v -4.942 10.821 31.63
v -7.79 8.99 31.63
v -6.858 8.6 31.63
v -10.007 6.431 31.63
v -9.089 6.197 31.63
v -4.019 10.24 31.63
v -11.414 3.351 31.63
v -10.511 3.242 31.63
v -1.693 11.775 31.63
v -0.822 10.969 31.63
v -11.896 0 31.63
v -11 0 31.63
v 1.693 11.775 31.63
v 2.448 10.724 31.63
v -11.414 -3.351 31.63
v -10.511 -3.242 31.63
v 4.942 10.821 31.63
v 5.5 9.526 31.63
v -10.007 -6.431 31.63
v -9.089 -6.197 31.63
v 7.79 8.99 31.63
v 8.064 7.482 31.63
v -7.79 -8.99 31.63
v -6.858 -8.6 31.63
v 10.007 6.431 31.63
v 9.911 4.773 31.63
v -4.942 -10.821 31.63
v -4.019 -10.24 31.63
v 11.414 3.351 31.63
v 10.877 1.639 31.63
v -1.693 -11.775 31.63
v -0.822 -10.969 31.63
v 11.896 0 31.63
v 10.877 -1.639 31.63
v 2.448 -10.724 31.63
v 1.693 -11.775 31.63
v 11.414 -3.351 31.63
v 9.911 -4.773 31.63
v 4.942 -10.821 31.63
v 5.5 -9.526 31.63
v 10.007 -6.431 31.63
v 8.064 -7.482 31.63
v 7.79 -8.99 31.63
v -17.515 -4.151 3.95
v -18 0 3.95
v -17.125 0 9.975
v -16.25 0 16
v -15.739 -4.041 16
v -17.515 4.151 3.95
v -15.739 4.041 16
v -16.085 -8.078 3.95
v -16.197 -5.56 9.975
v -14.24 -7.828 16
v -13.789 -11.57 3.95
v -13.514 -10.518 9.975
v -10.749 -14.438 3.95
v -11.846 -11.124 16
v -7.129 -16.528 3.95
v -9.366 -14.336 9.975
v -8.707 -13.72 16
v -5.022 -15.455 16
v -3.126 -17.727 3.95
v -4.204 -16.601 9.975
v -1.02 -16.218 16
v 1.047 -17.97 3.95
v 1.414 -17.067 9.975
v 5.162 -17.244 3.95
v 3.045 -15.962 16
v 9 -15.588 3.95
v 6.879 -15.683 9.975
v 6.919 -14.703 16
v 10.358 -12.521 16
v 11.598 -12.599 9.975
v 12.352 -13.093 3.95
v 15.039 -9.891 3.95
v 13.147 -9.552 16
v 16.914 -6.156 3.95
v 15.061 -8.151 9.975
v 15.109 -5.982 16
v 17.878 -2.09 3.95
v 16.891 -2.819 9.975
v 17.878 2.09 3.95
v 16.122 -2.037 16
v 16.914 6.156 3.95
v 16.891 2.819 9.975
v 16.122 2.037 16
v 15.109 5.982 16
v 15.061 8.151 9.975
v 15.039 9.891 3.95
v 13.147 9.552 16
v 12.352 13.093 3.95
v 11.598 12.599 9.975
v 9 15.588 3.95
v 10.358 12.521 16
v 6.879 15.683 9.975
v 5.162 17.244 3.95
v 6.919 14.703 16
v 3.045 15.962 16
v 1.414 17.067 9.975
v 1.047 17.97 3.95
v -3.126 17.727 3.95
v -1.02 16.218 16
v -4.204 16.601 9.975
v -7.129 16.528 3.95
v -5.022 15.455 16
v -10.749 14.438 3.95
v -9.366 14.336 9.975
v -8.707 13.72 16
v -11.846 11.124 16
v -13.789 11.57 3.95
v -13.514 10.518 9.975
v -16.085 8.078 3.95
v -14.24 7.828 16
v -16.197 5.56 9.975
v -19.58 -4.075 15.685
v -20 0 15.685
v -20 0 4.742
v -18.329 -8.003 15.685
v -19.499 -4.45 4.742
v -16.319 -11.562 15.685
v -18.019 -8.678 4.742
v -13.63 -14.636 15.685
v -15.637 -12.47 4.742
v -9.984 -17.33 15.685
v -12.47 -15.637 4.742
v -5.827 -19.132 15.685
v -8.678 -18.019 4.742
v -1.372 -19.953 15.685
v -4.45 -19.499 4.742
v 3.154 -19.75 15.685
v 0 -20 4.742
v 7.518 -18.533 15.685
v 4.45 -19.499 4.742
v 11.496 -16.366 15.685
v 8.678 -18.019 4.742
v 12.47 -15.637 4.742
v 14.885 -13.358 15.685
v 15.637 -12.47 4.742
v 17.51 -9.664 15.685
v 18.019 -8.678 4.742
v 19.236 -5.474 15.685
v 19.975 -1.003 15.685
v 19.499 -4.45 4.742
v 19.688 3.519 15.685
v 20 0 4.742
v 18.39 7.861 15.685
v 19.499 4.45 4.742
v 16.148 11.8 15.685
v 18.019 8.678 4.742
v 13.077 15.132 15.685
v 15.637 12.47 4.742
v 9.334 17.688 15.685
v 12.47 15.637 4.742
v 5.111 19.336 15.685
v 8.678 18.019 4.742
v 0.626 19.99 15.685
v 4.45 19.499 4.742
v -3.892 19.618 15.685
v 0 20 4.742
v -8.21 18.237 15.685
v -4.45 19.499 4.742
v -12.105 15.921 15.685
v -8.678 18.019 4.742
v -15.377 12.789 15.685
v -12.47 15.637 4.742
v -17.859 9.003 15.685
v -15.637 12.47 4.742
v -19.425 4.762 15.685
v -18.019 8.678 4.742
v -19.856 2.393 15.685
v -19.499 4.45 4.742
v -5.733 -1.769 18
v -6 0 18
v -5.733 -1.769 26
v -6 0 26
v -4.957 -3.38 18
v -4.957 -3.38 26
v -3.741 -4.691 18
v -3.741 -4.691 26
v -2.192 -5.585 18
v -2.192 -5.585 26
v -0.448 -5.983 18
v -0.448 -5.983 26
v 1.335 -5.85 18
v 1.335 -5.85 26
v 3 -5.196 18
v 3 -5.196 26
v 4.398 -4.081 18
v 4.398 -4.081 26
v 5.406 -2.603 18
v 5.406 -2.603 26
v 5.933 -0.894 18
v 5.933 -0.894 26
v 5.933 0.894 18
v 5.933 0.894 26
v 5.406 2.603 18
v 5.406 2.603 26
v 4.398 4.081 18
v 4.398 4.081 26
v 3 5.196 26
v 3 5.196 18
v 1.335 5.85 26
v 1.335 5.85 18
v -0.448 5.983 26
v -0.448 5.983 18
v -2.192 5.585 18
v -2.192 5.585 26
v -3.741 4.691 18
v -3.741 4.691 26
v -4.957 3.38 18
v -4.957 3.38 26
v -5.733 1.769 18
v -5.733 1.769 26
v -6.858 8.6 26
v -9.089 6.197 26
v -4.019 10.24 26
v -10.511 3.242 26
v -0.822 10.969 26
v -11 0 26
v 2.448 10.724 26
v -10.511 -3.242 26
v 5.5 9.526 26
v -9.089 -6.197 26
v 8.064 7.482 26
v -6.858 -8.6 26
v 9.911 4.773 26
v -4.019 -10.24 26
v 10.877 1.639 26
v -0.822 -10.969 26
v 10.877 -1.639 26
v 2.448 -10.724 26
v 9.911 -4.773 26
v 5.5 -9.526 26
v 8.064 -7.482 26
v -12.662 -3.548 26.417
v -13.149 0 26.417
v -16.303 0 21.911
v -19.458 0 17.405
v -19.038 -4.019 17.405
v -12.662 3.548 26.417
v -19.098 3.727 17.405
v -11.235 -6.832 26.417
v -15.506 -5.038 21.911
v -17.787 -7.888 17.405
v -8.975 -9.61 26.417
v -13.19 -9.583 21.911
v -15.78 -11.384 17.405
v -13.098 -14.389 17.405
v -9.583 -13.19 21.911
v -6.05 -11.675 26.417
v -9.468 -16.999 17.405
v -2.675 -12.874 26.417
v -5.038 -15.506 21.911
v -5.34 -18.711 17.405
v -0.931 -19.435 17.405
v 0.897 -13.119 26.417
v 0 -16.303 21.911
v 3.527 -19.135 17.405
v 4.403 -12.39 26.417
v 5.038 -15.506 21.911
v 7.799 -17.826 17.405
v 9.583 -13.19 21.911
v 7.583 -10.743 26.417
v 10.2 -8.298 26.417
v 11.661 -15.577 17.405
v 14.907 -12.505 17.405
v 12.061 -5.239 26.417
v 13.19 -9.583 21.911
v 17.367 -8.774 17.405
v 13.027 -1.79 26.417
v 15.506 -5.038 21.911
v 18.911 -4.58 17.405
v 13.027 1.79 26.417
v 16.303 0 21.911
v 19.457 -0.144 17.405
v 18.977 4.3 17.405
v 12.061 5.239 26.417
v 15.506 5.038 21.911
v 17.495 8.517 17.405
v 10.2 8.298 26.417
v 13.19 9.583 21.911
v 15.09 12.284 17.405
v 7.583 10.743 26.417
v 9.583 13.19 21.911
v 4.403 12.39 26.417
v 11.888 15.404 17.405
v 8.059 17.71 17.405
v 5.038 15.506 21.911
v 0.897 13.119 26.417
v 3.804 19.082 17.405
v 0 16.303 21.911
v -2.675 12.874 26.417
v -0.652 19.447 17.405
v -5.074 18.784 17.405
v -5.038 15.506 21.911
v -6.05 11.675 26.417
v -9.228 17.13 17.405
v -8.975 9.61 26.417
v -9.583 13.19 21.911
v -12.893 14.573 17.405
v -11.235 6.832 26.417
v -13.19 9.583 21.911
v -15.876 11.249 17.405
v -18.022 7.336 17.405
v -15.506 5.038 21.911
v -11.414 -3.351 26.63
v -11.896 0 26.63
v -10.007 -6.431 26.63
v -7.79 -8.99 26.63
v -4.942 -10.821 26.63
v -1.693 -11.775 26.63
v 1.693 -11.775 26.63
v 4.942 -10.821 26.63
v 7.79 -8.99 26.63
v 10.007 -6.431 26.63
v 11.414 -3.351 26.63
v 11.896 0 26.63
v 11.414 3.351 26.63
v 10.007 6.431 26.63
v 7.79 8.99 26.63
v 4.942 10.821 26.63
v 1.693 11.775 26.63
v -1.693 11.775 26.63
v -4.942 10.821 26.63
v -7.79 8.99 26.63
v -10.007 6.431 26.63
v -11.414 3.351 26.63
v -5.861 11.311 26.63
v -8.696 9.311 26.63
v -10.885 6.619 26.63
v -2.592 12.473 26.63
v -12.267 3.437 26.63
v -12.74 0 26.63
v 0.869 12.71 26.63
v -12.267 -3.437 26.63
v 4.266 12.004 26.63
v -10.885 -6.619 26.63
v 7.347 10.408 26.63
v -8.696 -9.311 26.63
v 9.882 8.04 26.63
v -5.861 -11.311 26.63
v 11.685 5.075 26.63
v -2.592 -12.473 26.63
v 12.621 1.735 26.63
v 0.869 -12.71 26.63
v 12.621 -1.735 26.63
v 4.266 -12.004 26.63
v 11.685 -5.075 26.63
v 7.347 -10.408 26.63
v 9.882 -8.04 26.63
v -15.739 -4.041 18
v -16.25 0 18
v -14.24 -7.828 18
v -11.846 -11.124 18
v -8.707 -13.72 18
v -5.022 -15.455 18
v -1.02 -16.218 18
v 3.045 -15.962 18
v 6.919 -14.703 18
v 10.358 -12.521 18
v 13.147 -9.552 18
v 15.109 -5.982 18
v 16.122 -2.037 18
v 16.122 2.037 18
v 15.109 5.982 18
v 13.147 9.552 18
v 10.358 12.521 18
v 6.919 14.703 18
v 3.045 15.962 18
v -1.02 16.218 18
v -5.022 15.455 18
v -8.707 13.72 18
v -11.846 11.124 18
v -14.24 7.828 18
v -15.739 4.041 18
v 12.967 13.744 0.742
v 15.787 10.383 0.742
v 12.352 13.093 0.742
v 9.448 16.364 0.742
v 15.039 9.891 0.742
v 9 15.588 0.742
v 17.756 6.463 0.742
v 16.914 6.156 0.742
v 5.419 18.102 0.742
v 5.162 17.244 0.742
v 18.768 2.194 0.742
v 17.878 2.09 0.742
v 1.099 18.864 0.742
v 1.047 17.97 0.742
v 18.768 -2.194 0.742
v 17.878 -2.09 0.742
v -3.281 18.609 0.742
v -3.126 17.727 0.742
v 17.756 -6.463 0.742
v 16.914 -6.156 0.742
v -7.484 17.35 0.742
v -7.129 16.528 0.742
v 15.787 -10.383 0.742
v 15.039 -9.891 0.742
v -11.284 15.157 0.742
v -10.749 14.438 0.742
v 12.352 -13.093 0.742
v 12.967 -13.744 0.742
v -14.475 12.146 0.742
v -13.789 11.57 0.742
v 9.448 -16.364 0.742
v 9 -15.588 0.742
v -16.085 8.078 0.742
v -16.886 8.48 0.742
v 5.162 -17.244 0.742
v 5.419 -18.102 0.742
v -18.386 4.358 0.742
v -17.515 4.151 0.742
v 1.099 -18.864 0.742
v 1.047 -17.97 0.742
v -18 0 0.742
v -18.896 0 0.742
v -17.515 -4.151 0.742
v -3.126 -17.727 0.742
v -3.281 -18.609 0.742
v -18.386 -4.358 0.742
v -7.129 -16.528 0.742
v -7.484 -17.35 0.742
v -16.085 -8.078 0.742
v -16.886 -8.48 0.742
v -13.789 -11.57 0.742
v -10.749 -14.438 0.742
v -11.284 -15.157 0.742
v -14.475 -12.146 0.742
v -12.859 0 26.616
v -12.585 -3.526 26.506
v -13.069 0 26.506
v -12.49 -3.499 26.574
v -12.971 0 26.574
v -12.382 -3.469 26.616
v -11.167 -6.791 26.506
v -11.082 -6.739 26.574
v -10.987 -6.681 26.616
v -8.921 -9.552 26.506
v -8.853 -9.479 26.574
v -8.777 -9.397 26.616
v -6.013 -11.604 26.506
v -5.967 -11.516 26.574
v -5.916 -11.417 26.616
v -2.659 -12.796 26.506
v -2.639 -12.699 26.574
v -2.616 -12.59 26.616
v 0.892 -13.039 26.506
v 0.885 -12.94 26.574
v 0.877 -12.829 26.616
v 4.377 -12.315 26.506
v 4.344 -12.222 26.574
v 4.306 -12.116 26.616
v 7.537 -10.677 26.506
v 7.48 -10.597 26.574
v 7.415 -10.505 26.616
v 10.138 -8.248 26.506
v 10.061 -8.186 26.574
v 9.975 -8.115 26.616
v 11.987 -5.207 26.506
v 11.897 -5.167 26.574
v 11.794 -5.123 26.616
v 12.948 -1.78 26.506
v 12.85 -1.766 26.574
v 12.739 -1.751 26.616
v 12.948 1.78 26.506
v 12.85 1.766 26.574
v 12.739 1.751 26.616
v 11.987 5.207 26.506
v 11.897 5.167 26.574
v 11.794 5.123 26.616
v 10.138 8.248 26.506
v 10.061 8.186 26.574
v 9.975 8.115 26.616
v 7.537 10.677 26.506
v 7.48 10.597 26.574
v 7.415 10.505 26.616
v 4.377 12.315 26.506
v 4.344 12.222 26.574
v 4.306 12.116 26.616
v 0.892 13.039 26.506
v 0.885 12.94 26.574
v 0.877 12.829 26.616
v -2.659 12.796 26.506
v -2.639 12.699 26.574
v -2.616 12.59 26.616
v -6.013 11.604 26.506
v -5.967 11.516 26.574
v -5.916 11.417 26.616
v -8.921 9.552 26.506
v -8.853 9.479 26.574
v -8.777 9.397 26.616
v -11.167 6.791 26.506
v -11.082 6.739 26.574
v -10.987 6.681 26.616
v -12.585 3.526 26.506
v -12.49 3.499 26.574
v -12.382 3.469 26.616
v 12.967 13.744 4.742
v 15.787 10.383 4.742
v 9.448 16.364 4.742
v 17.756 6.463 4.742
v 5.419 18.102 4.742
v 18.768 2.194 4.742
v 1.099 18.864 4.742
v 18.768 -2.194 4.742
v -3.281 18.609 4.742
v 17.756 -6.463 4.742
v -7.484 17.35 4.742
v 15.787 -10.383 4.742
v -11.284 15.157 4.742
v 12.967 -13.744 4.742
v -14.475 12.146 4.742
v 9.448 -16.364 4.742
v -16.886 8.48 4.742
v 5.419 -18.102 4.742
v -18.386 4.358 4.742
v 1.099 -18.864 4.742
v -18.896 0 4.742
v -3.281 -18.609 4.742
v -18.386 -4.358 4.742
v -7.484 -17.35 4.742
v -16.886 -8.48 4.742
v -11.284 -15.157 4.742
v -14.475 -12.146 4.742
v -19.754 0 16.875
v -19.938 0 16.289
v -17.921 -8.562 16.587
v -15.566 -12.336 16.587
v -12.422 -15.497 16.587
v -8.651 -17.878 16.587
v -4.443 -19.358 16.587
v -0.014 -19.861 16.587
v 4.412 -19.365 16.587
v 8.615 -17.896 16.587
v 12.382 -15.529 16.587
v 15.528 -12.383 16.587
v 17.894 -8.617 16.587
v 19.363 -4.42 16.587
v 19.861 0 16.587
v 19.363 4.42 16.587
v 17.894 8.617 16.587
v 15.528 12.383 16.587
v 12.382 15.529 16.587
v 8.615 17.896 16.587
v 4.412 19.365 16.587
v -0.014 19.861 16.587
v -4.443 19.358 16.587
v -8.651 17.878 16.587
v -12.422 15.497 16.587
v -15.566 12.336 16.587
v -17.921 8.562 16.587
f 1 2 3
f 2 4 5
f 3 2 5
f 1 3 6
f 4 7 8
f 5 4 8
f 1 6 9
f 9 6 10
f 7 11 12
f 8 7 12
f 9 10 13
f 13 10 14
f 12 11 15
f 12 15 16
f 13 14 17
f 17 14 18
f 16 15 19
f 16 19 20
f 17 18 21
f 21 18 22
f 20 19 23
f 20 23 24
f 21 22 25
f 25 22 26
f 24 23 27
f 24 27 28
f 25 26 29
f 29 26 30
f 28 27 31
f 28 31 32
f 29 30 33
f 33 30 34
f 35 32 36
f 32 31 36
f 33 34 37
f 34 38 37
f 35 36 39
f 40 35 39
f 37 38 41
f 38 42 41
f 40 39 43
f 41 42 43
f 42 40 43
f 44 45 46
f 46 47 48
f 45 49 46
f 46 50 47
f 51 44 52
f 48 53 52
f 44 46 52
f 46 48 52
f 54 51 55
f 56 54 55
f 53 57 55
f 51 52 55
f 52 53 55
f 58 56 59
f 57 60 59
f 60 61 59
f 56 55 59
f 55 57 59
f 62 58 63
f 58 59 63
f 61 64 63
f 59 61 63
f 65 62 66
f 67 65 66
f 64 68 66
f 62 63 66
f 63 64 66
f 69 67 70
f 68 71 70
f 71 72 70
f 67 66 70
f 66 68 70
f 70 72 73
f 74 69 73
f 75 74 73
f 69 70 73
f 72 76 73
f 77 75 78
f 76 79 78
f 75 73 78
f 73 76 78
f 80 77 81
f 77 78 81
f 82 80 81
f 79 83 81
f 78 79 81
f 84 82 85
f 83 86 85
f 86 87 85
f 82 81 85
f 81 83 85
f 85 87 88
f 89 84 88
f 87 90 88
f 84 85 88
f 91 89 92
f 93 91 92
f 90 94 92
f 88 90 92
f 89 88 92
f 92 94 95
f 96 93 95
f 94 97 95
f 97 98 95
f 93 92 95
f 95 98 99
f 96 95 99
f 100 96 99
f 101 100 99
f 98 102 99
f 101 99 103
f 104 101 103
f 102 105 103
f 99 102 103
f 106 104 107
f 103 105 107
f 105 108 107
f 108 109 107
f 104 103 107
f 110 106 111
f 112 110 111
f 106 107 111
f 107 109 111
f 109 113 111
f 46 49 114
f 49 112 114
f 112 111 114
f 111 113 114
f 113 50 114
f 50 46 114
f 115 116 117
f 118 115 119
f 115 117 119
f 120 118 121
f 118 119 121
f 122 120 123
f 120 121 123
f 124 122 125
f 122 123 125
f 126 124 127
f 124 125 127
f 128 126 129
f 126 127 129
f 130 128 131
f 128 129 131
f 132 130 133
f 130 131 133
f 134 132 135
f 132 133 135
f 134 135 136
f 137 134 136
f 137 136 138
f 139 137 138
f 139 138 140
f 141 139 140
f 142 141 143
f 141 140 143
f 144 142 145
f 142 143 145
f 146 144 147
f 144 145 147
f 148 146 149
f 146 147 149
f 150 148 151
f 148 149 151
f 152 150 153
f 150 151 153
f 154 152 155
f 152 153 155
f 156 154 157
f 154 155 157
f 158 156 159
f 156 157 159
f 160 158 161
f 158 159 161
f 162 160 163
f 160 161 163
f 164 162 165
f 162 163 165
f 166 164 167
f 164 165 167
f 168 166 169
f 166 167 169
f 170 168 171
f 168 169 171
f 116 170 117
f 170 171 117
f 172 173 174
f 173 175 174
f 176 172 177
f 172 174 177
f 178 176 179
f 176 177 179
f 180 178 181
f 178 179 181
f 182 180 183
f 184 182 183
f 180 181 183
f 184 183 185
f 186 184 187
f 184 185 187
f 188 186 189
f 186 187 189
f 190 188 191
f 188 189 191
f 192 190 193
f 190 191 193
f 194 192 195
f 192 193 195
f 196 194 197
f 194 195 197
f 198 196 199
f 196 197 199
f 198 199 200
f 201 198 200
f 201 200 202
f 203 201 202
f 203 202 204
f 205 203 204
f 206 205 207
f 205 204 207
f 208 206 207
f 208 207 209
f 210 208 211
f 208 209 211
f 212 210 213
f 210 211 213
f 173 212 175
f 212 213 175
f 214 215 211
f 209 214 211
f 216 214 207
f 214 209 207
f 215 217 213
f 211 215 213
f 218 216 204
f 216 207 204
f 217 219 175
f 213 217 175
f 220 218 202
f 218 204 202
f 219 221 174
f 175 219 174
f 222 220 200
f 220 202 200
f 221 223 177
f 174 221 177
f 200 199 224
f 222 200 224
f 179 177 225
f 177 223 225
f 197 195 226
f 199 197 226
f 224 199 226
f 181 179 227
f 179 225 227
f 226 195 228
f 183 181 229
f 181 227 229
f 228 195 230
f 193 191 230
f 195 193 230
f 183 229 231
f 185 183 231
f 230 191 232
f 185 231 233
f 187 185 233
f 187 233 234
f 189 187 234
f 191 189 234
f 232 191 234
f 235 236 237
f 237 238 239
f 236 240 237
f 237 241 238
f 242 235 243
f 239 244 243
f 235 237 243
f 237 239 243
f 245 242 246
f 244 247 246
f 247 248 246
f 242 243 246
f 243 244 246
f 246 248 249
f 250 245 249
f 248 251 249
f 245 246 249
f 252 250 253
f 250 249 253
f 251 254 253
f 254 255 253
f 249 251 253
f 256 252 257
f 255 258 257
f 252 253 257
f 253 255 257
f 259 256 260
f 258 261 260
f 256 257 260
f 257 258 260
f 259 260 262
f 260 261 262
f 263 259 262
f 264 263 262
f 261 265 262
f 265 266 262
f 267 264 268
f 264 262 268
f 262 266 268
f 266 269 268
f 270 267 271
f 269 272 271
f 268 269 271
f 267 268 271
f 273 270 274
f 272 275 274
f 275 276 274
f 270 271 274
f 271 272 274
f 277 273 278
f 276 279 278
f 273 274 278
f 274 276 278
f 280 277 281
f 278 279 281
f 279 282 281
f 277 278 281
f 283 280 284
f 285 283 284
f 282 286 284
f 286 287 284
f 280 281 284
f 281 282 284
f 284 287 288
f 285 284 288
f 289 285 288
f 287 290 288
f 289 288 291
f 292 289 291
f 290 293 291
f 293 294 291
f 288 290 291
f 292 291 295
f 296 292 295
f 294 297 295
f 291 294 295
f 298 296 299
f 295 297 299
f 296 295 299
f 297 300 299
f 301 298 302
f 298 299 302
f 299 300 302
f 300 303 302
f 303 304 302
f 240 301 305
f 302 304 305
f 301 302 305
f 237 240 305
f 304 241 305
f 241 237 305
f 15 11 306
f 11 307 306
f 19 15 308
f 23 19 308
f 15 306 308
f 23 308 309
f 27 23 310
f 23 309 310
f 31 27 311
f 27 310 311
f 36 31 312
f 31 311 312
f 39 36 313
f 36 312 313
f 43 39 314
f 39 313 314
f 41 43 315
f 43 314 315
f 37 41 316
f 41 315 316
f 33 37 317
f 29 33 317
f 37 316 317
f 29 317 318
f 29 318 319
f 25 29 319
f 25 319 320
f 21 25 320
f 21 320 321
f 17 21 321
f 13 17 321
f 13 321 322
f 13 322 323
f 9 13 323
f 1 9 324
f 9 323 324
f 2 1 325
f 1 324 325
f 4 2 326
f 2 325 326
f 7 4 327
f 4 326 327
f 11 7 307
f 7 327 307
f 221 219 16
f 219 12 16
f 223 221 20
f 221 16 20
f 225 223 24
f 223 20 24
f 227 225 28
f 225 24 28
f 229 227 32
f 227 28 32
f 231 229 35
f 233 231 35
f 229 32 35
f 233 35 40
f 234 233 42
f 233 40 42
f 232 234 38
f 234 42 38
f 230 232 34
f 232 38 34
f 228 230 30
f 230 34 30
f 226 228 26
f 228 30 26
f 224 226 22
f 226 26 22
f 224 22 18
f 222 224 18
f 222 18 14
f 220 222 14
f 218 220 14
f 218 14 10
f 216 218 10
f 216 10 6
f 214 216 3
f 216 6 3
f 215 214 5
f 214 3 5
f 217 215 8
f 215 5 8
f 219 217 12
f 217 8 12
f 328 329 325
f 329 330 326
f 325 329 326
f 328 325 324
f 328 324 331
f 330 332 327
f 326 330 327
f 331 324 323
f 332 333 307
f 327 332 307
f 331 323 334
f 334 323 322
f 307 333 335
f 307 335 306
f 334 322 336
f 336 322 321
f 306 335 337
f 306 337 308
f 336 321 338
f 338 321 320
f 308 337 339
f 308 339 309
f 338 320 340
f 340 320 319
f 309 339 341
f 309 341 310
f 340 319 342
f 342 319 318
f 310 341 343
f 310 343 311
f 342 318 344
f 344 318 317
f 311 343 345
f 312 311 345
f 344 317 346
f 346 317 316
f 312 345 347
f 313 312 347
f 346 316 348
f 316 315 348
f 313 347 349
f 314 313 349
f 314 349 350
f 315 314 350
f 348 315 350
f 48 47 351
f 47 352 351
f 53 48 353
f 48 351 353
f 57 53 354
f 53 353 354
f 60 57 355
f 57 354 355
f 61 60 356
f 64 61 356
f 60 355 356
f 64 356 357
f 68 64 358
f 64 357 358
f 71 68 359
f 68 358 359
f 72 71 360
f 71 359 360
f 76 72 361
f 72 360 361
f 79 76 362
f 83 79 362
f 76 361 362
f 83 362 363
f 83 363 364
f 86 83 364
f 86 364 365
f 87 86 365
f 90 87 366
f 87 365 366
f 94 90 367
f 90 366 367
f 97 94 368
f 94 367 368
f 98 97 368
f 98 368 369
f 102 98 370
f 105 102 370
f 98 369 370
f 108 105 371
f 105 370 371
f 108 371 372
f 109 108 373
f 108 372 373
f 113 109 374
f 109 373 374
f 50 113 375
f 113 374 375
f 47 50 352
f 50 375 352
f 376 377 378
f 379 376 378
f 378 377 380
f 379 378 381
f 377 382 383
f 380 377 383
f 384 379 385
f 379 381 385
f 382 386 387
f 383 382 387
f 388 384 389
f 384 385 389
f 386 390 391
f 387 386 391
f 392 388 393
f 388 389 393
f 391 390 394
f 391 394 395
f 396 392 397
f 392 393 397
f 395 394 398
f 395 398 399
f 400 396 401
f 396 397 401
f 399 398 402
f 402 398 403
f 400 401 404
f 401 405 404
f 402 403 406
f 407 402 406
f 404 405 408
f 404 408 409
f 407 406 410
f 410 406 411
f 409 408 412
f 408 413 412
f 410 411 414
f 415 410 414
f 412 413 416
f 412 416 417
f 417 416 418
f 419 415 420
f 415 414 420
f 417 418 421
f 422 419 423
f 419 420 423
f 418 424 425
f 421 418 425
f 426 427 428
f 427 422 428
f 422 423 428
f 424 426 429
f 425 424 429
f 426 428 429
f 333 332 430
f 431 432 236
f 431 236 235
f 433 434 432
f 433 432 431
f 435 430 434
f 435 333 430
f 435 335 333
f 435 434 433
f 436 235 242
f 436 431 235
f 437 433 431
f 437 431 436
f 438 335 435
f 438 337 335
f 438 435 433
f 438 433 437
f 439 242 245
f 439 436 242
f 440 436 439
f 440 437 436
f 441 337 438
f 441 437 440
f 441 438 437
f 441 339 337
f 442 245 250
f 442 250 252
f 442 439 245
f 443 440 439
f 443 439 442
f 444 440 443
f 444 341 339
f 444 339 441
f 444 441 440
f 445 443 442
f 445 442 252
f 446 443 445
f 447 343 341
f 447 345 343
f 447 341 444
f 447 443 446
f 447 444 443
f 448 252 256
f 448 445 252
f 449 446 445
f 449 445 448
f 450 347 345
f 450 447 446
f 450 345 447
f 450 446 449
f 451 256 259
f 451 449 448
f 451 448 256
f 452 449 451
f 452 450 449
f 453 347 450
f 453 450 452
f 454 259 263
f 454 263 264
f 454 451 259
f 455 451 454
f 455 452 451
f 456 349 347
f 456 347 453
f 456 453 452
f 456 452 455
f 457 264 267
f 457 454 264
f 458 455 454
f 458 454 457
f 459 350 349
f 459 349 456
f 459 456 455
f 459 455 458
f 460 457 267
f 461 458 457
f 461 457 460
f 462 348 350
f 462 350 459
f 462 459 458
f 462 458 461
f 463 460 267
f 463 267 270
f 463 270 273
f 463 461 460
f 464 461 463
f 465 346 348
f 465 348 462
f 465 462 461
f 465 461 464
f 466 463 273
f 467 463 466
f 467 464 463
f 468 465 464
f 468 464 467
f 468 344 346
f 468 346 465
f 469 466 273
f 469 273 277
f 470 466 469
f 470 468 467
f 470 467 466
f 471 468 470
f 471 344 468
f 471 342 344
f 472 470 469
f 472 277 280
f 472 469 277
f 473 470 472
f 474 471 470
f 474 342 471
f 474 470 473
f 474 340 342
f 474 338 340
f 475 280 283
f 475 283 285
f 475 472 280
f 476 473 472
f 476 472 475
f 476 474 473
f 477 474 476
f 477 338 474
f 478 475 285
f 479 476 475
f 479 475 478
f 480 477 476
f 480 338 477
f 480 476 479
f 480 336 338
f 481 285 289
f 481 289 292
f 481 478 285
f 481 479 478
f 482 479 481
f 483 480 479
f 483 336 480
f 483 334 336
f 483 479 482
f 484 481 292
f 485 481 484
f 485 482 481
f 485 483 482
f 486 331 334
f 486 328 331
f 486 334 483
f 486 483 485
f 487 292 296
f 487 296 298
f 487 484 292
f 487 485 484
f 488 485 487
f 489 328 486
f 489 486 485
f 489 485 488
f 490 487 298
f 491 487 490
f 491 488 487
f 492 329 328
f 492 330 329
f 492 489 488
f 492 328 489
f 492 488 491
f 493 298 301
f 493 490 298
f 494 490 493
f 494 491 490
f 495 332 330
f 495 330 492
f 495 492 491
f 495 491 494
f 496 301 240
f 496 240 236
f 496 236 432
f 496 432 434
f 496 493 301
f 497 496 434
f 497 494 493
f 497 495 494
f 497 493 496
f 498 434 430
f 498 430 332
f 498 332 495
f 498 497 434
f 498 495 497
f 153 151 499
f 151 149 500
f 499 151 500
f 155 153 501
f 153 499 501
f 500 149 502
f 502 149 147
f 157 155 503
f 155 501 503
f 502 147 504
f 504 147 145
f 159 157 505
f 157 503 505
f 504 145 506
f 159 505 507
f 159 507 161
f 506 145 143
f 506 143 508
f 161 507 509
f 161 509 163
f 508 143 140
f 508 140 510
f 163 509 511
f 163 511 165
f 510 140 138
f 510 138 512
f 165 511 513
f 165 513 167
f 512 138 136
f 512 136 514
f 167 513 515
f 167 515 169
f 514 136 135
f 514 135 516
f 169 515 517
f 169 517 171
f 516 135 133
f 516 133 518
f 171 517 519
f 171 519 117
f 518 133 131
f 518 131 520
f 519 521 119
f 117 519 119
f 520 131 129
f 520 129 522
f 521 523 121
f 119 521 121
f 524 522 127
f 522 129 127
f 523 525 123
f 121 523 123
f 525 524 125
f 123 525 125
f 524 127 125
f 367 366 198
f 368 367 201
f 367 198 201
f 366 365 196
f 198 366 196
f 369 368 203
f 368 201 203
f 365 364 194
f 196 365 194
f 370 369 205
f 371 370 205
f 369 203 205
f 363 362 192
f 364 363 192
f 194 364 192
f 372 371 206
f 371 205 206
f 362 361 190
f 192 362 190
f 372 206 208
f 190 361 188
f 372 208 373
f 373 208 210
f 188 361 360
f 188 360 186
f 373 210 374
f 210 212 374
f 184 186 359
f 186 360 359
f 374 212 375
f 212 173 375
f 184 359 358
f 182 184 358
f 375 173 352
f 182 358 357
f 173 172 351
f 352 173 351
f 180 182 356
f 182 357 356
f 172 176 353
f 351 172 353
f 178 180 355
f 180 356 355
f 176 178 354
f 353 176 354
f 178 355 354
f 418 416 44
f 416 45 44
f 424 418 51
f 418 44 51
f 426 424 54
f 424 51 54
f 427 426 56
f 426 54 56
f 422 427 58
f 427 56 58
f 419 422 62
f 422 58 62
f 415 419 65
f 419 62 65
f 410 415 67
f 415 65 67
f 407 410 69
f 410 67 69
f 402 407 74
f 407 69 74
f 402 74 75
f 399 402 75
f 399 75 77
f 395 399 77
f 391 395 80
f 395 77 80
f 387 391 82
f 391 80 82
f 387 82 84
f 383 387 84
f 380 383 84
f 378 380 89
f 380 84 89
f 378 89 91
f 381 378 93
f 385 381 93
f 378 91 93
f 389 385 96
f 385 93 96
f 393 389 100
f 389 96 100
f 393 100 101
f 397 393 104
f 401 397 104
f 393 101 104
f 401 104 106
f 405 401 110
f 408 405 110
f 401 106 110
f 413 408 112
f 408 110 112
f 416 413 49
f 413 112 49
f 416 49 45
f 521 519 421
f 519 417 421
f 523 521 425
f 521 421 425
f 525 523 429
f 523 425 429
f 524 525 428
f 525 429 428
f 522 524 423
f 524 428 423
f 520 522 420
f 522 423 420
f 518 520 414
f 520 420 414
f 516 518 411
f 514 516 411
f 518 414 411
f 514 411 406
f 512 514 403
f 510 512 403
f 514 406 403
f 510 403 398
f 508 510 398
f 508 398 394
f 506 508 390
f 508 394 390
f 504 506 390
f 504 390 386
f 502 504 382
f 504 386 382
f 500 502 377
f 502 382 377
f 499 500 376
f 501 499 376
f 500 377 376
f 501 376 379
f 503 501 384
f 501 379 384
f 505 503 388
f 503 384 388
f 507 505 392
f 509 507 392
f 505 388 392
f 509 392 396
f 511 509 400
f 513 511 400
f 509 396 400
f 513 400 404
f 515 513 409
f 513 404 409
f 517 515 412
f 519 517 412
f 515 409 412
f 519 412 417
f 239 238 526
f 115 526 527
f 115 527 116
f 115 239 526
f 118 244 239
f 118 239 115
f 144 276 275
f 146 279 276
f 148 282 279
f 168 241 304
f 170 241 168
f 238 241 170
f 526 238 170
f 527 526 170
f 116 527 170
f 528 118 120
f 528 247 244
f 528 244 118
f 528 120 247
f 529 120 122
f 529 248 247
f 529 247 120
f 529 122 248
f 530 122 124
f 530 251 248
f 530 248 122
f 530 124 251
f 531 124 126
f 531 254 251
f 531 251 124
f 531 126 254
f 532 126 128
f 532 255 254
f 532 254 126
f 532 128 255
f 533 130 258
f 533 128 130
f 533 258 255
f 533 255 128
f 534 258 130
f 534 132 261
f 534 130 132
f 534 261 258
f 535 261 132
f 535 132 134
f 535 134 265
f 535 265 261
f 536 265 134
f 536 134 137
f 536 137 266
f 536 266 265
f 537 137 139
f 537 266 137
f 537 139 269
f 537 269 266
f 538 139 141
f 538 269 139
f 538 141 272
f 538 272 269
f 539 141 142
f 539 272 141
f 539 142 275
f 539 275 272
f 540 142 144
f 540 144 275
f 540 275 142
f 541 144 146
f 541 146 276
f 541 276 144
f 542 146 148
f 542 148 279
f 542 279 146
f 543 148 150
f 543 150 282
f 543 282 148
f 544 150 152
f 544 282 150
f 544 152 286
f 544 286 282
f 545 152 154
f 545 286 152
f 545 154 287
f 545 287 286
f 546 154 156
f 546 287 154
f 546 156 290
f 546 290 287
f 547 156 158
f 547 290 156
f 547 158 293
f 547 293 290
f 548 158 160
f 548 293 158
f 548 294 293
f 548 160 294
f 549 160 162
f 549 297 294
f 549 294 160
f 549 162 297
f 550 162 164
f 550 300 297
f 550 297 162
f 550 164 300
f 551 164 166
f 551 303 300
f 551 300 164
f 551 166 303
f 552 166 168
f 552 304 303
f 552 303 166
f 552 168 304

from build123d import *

# Parameters (mm, degrees)
FILLET1_R = 3
FILLET2_R = 0.5


with BuildPart() as part:
    # base-sketch-2 → Revolve1 (revolve)
    with BuildSketch(Plane(origin=(0, 0, 0), x_dir=(1, 0, 0), z_dir=(0, 1, 0)), mode=Mode.PRIVATE) as revolve1_sk:
        Polygon((11, -26), (16.6, -18), (16.25, -18), (6, -18), (6, -26), align=None)
        Polygon((18.8956045, -0.741902481), (18, -0.741902481), (18, -3.95), (18, -16), (16.6, -18), (11, -26), (11, -31.630444462), (11.8956045, -31.630444462), (11.8956045, -26.630444462), (13, -26.630444462), (20, -16.630444462), (20, -4.741902481), (18.8956045, -4.741902481), align=None)
        Polygon((18, -16), (18, -3.95), (16.25, -16), (16.25, -18), (16.6, -18), align=None)
    revolve(revolve1_sk.sketch.rotate(Axis((0, 0, 0), (0, 0, 1)), 180), axis=Axis((0, 0, 0), (0, 0, 1)))

    # Fillet1
    fillet1_edges = [part.edges().sort_by_distance(p)[0] for p in [
        (20, 0, 16.630444462),
    ]]
    fillet(fillet1_edges, radius=FILLET1_R)

    # Fillet2
    fillet2_edges = [part.edges().sort_by_distance(p)[0] for p in [
        (13, 0, 26.630444462),
    ]]
    fillet(fillet2_edges, radius=FILLET2_R)


solid = part.part
